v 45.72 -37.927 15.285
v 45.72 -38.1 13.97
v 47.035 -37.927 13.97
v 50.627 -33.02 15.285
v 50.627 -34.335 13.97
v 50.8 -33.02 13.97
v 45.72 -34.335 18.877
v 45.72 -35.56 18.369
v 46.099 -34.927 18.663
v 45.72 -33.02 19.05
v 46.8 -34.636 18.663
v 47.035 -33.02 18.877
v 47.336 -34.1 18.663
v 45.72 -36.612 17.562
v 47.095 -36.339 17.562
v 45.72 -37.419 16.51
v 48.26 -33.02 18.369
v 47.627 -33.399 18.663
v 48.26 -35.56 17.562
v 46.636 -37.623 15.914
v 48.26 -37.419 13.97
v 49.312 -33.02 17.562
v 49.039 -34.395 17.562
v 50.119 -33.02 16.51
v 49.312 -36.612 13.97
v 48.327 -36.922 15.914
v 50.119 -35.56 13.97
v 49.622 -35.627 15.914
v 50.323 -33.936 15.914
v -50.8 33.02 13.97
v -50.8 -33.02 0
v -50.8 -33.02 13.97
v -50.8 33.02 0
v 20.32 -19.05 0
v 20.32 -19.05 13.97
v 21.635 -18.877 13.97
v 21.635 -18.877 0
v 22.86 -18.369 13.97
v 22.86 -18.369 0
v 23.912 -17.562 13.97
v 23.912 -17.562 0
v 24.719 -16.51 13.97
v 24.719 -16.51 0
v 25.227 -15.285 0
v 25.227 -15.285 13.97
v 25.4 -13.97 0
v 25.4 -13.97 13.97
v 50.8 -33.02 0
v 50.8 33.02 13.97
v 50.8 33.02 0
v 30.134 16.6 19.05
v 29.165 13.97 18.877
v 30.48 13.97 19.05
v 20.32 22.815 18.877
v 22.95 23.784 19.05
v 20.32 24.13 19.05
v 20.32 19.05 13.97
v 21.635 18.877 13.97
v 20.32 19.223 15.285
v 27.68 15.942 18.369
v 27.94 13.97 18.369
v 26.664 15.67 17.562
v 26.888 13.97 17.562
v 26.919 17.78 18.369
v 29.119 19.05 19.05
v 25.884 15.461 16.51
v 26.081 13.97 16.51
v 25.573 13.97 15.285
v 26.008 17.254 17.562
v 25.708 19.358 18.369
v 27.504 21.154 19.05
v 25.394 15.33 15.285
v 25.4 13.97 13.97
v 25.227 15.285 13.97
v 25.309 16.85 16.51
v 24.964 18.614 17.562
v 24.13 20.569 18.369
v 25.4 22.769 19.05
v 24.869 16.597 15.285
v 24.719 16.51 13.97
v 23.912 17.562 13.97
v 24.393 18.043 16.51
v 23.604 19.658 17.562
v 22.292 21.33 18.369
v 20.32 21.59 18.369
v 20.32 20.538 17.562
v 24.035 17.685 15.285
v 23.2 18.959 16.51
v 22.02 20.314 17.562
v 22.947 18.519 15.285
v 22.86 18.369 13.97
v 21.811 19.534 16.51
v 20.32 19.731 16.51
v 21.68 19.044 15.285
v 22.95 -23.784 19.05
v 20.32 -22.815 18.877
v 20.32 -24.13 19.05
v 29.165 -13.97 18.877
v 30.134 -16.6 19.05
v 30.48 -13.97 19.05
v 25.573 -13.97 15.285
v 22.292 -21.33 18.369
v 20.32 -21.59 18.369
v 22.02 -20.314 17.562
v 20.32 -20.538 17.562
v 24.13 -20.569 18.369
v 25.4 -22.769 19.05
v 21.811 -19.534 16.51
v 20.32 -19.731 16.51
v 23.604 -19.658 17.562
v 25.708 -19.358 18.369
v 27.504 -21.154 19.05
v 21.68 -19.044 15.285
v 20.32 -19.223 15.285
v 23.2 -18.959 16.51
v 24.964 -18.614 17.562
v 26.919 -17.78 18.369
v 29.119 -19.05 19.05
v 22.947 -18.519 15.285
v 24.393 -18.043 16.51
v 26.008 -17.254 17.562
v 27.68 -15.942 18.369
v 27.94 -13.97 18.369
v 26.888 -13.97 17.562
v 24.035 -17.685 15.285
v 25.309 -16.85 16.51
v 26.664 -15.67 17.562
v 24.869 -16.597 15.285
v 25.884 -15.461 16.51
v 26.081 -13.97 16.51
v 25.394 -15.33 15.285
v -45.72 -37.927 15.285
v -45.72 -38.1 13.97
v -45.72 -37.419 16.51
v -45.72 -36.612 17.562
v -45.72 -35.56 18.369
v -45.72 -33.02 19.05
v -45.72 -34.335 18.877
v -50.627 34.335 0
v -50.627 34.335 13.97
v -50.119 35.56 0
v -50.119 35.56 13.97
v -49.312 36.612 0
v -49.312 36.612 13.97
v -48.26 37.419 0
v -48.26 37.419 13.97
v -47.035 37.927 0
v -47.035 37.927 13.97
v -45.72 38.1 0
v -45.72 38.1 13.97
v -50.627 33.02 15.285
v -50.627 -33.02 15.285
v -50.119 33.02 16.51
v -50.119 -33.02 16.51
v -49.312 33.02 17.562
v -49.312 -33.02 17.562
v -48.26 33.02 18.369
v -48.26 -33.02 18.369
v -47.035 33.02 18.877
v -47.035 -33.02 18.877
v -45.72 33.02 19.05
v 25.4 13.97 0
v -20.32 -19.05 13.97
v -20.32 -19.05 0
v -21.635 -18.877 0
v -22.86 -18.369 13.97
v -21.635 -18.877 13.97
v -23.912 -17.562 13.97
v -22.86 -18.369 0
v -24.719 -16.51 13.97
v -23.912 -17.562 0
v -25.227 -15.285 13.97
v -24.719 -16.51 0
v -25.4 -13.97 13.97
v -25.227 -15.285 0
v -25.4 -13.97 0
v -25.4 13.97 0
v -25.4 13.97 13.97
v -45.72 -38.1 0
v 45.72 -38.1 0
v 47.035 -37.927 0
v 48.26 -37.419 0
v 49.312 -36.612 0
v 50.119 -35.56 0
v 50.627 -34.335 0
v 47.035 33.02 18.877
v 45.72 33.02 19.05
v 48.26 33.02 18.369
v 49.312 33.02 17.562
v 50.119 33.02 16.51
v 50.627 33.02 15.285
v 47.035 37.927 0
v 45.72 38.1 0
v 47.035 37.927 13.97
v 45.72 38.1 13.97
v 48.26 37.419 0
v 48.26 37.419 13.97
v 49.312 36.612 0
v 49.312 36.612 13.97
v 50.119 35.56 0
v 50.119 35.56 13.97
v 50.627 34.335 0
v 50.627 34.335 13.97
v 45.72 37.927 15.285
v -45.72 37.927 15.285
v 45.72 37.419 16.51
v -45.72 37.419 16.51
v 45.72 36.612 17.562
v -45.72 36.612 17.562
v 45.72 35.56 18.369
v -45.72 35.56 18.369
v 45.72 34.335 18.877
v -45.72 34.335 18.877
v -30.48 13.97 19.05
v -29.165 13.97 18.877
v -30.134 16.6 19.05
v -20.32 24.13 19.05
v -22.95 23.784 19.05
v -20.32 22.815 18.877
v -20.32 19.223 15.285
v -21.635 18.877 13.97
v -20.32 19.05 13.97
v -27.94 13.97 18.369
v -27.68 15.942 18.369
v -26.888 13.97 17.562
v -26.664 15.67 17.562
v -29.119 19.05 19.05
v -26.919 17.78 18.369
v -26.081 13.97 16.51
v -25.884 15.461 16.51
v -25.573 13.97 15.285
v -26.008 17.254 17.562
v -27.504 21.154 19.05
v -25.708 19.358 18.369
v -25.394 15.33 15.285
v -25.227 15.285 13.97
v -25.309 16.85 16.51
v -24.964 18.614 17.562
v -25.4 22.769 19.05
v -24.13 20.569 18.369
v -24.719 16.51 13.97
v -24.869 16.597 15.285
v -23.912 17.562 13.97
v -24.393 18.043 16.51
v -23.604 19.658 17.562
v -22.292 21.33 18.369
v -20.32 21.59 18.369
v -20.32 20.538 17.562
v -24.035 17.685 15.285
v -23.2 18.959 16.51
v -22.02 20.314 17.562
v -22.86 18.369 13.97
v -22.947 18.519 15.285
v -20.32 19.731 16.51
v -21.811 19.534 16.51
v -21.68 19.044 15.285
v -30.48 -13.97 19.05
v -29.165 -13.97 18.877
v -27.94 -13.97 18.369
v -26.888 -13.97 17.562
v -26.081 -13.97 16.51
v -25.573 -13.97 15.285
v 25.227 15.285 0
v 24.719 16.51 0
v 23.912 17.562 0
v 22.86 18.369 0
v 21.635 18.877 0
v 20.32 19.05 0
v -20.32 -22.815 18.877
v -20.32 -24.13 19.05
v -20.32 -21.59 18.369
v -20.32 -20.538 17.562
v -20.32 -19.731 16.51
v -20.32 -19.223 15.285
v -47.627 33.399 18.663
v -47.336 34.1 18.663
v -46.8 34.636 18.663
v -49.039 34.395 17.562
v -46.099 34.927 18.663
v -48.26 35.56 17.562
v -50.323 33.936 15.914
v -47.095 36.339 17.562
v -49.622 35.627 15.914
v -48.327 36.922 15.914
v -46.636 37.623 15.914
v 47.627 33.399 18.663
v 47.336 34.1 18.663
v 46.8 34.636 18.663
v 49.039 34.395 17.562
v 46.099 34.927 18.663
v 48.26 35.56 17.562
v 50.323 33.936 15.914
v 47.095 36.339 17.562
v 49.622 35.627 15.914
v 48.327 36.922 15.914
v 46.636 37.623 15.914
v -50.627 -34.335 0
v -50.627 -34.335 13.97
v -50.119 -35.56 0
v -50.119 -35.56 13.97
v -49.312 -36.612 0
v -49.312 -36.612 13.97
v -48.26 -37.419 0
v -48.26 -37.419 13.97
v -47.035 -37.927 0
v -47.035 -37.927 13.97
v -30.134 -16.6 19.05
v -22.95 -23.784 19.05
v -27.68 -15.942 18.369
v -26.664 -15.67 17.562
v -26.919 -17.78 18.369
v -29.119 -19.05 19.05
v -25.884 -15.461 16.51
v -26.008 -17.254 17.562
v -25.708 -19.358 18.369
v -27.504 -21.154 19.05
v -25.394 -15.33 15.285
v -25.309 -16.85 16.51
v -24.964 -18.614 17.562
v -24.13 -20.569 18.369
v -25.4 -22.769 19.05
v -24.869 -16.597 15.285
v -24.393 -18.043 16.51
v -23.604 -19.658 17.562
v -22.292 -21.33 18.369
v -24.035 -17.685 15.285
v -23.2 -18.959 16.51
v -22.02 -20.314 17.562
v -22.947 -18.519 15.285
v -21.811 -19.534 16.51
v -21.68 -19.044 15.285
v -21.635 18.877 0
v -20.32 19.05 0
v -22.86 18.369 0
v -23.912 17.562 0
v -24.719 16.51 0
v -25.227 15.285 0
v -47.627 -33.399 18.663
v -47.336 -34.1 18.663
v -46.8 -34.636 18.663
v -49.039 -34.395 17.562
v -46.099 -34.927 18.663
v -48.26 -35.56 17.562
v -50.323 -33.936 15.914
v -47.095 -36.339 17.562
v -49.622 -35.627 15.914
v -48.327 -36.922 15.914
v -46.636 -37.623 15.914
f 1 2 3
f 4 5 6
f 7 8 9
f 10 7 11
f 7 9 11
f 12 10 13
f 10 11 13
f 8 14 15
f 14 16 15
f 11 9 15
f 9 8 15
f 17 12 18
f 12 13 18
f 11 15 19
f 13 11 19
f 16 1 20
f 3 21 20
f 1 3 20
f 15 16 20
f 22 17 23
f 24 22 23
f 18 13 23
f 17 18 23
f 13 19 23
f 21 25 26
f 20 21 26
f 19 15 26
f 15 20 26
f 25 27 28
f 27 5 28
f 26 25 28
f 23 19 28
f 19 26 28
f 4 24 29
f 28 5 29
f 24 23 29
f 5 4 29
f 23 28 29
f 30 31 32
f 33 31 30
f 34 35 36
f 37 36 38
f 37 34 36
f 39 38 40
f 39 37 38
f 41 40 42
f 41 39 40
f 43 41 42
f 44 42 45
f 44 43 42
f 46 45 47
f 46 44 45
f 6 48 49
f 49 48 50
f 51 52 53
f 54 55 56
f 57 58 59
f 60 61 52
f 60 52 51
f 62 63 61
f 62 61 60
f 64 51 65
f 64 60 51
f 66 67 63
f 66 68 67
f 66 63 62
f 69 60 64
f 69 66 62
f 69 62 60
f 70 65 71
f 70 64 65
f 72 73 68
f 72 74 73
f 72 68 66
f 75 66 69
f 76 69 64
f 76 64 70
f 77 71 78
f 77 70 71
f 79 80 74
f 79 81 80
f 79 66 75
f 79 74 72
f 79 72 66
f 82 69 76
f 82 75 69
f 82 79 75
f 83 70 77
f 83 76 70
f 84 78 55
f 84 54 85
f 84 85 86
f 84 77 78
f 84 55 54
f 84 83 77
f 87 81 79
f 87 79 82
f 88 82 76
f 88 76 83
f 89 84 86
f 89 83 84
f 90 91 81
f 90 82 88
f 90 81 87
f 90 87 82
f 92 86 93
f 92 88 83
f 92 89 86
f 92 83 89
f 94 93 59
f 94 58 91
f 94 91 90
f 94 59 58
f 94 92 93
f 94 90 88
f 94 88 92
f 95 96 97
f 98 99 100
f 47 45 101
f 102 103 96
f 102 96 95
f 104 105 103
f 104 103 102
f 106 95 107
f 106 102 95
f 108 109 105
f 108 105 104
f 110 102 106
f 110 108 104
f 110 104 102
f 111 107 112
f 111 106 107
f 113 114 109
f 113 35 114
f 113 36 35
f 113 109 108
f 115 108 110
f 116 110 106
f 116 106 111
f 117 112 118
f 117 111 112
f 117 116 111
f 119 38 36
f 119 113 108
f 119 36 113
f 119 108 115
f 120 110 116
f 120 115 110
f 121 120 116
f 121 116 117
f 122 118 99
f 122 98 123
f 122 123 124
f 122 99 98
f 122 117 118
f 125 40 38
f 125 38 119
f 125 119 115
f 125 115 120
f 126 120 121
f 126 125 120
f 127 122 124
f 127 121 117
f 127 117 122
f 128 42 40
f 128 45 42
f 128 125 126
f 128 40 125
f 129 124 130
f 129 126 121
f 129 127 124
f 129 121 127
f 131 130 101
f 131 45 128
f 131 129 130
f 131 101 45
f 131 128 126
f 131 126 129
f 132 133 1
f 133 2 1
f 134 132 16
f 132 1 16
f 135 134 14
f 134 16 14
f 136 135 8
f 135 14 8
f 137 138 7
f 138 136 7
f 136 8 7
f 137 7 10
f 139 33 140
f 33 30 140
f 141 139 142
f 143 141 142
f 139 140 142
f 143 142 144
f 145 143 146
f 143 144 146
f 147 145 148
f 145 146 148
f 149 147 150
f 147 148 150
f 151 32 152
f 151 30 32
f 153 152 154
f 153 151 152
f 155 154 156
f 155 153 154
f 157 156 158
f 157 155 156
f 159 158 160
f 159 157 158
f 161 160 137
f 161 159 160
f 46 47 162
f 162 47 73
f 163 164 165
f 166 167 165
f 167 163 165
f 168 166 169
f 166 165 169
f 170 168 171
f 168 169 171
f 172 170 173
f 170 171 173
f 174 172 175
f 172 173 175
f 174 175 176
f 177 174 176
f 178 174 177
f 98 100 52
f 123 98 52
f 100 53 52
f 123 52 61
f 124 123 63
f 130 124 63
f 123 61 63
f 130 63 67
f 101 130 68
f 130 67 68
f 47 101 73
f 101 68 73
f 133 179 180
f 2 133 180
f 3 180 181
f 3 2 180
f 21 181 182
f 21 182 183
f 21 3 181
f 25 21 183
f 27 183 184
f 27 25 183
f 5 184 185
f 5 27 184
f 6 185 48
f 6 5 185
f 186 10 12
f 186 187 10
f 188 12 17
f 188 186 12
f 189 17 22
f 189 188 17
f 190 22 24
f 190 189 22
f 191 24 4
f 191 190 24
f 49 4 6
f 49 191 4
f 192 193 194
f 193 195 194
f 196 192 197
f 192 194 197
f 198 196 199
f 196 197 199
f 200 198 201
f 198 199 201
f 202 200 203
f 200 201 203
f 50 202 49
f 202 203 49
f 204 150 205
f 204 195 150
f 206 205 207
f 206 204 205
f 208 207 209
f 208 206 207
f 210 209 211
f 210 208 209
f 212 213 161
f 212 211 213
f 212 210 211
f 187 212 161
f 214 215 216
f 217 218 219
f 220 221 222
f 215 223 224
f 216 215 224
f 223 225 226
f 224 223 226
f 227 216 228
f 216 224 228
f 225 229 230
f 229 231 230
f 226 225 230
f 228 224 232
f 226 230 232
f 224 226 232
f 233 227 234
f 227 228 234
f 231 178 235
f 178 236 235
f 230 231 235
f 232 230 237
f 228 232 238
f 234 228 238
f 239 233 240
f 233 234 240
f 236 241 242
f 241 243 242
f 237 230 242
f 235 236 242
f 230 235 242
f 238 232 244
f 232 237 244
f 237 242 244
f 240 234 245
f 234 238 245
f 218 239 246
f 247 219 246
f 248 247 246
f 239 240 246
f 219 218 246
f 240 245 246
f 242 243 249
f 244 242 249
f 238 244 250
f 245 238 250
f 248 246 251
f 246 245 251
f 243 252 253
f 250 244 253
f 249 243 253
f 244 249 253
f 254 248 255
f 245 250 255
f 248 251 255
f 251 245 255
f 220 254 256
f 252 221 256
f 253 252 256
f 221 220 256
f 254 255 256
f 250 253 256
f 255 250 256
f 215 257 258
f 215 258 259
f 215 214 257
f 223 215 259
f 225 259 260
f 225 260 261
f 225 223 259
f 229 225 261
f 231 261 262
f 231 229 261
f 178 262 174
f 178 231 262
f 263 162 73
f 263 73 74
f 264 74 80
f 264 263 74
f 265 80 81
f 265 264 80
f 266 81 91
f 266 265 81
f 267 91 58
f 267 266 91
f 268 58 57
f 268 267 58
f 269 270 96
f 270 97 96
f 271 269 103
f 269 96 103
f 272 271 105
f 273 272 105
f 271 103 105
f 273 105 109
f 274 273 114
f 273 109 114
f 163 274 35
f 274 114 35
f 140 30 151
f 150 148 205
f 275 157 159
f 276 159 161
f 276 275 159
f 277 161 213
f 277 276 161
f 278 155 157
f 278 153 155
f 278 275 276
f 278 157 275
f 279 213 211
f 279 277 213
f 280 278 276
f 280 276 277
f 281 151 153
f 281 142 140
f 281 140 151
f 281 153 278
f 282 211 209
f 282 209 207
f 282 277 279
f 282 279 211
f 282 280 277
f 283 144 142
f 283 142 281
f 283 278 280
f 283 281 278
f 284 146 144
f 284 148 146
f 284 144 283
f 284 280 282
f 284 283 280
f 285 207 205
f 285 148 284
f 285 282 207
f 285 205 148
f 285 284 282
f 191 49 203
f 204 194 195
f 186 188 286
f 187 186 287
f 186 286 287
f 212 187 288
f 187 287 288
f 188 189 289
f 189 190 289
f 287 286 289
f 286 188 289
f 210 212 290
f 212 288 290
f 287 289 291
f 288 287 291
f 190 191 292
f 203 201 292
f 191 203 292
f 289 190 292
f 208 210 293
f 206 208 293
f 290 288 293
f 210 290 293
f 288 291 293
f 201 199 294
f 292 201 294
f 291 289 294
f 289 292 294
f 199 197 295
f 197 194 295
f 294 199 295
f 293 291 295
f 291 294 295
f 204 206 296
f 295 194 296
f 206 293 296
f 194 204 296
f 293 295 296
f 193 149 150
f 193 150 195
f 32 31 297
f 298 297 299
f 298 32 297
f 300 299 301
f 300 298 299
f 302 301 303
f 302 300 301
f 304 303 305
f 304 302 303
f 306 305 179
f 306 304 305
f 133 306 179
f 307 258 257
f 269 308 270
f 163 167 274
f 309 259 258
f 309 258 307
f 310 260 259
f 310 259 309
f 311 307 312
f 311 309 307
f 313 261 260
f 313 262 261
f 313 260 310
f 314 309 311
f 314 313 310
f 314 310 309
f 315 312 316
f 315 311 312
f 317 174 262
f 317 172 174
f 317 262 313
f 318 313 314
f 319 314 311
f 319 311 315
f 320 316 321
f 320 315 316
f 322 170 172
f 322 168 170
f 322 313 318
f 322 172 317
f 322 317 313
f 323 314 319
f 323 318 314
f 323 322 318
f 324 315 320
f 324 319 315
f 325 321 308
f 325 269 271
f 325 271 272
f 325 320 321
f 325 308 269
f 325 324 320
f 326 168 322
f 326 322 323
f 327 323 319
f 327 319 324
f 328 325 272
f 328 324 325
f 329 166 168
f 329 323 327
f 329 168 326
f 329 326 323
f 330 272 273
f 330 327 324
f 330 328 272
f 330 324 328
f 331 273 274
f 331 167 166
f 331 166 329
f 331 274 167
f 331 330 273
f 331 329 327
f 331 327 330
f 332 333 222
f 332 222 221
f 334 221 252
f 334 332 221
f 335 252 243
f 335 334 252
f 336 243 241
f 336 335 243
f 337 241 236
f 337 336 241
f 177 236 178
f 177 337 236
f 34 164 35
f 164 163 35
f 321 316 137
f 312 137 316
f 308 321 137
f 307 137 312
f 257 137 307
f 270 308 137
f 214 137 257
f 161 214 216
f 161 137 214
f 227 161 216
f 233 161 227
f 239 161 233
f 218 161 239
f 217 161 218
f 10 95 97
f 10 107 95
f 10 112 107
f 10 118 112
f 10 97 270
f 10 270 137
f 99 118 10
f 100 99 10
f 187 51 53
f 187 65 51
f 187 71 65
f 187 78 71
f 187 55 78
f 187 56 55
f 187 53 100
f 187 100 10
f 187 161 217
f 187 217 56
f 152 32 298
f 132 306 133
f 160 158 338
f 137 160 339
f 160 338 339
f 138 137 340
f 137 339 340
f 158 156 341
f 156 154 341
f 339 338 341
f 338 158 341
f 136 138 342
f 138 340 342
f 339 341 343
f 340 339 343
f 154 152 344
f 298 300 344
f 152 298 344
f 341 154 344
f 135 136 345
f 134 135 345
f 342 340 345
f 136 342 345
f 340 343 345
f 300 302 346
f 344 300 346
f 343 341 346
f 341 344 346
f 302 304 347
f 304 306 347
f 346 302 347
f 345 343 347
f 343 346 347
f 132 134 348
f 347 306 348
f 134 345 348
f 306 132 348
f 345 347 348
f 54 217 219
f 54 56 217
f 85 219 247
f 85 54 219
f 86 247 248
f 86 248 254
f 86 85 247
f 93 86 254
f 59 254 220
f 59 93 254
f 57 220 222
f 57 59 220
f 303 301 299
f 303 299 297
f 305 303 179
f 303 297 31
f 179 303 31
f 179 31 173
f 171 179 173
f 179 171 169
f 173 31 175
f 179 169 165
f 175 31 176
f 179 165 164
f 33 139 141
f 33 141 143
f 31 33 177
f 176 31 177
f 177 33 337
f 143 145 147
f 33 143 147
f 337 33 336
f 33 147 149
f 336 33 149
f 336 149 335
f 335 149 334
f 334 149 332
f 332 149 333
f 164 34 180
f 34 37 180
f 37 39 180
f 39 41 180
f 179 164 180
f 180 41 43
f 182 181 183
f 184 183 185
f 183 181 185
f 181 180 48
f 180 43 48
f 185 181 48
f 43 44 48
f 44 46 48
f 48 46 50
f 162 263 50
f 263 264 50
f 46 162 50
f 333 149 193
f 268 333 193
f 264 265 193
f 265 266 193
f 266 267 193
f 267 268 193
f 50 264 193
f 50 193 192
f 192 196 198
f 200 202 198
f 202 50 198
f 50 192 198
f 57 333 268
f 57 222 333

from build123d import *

# Parameters (mm, degrees)
F0_W     = 101.6
F0_H     = 76.2
F1_DEPTH = 19.05
F2_W     = 50.8
F2_H     = 38.1
F3_DEPTH = 25.4
F4_R     = 5.08


with BuildPart() as f1:
    # F0 (on Top) → F1 (new body)
    with BuildSketch(Plane.XY):
        Rectangle(F0_W, F0_H)
    extrude(amount=F1_DEPTH)

    # F2 (on face) → F3 (cut)
    with BuildSketch(Plane.XY.offset(19.05)):
        Rectangle(F2_W, F2_H)
    extrude(amount=-F3_DEPTH, mode=Mode.SUBTRACT)

    # F4
    f4_edges = [f1.edges().sort_by_distance(p)[0] for p in [
        (-50.8, 38.1, 9.525),
        (-50.8, -38.1, 9.525),
        (50.8, 38.1, 9.525),
        (25.4, -19.05, 9.525),
        (-25.4, 19.05, 9.525),
        (50.8, -38.1, 9.525),
        (-25.4, -19.05, 9.525),
        (-25.4, 0, 19.05),
        (-50.8, 0, 19.05),
        (0, -38.1, 19.05),
        (50.8, 0, 19.05),
        (0, 38.1, 19.05),
        (25.4, 19.05, 9.525),
        (0, -19.05, 19.05),
        (25.4, 0, 19.05),
        (0, 19.05, 19.05),
    ]]
    fillet(f4_edges, radius=F4_R)


solid = f1.part
